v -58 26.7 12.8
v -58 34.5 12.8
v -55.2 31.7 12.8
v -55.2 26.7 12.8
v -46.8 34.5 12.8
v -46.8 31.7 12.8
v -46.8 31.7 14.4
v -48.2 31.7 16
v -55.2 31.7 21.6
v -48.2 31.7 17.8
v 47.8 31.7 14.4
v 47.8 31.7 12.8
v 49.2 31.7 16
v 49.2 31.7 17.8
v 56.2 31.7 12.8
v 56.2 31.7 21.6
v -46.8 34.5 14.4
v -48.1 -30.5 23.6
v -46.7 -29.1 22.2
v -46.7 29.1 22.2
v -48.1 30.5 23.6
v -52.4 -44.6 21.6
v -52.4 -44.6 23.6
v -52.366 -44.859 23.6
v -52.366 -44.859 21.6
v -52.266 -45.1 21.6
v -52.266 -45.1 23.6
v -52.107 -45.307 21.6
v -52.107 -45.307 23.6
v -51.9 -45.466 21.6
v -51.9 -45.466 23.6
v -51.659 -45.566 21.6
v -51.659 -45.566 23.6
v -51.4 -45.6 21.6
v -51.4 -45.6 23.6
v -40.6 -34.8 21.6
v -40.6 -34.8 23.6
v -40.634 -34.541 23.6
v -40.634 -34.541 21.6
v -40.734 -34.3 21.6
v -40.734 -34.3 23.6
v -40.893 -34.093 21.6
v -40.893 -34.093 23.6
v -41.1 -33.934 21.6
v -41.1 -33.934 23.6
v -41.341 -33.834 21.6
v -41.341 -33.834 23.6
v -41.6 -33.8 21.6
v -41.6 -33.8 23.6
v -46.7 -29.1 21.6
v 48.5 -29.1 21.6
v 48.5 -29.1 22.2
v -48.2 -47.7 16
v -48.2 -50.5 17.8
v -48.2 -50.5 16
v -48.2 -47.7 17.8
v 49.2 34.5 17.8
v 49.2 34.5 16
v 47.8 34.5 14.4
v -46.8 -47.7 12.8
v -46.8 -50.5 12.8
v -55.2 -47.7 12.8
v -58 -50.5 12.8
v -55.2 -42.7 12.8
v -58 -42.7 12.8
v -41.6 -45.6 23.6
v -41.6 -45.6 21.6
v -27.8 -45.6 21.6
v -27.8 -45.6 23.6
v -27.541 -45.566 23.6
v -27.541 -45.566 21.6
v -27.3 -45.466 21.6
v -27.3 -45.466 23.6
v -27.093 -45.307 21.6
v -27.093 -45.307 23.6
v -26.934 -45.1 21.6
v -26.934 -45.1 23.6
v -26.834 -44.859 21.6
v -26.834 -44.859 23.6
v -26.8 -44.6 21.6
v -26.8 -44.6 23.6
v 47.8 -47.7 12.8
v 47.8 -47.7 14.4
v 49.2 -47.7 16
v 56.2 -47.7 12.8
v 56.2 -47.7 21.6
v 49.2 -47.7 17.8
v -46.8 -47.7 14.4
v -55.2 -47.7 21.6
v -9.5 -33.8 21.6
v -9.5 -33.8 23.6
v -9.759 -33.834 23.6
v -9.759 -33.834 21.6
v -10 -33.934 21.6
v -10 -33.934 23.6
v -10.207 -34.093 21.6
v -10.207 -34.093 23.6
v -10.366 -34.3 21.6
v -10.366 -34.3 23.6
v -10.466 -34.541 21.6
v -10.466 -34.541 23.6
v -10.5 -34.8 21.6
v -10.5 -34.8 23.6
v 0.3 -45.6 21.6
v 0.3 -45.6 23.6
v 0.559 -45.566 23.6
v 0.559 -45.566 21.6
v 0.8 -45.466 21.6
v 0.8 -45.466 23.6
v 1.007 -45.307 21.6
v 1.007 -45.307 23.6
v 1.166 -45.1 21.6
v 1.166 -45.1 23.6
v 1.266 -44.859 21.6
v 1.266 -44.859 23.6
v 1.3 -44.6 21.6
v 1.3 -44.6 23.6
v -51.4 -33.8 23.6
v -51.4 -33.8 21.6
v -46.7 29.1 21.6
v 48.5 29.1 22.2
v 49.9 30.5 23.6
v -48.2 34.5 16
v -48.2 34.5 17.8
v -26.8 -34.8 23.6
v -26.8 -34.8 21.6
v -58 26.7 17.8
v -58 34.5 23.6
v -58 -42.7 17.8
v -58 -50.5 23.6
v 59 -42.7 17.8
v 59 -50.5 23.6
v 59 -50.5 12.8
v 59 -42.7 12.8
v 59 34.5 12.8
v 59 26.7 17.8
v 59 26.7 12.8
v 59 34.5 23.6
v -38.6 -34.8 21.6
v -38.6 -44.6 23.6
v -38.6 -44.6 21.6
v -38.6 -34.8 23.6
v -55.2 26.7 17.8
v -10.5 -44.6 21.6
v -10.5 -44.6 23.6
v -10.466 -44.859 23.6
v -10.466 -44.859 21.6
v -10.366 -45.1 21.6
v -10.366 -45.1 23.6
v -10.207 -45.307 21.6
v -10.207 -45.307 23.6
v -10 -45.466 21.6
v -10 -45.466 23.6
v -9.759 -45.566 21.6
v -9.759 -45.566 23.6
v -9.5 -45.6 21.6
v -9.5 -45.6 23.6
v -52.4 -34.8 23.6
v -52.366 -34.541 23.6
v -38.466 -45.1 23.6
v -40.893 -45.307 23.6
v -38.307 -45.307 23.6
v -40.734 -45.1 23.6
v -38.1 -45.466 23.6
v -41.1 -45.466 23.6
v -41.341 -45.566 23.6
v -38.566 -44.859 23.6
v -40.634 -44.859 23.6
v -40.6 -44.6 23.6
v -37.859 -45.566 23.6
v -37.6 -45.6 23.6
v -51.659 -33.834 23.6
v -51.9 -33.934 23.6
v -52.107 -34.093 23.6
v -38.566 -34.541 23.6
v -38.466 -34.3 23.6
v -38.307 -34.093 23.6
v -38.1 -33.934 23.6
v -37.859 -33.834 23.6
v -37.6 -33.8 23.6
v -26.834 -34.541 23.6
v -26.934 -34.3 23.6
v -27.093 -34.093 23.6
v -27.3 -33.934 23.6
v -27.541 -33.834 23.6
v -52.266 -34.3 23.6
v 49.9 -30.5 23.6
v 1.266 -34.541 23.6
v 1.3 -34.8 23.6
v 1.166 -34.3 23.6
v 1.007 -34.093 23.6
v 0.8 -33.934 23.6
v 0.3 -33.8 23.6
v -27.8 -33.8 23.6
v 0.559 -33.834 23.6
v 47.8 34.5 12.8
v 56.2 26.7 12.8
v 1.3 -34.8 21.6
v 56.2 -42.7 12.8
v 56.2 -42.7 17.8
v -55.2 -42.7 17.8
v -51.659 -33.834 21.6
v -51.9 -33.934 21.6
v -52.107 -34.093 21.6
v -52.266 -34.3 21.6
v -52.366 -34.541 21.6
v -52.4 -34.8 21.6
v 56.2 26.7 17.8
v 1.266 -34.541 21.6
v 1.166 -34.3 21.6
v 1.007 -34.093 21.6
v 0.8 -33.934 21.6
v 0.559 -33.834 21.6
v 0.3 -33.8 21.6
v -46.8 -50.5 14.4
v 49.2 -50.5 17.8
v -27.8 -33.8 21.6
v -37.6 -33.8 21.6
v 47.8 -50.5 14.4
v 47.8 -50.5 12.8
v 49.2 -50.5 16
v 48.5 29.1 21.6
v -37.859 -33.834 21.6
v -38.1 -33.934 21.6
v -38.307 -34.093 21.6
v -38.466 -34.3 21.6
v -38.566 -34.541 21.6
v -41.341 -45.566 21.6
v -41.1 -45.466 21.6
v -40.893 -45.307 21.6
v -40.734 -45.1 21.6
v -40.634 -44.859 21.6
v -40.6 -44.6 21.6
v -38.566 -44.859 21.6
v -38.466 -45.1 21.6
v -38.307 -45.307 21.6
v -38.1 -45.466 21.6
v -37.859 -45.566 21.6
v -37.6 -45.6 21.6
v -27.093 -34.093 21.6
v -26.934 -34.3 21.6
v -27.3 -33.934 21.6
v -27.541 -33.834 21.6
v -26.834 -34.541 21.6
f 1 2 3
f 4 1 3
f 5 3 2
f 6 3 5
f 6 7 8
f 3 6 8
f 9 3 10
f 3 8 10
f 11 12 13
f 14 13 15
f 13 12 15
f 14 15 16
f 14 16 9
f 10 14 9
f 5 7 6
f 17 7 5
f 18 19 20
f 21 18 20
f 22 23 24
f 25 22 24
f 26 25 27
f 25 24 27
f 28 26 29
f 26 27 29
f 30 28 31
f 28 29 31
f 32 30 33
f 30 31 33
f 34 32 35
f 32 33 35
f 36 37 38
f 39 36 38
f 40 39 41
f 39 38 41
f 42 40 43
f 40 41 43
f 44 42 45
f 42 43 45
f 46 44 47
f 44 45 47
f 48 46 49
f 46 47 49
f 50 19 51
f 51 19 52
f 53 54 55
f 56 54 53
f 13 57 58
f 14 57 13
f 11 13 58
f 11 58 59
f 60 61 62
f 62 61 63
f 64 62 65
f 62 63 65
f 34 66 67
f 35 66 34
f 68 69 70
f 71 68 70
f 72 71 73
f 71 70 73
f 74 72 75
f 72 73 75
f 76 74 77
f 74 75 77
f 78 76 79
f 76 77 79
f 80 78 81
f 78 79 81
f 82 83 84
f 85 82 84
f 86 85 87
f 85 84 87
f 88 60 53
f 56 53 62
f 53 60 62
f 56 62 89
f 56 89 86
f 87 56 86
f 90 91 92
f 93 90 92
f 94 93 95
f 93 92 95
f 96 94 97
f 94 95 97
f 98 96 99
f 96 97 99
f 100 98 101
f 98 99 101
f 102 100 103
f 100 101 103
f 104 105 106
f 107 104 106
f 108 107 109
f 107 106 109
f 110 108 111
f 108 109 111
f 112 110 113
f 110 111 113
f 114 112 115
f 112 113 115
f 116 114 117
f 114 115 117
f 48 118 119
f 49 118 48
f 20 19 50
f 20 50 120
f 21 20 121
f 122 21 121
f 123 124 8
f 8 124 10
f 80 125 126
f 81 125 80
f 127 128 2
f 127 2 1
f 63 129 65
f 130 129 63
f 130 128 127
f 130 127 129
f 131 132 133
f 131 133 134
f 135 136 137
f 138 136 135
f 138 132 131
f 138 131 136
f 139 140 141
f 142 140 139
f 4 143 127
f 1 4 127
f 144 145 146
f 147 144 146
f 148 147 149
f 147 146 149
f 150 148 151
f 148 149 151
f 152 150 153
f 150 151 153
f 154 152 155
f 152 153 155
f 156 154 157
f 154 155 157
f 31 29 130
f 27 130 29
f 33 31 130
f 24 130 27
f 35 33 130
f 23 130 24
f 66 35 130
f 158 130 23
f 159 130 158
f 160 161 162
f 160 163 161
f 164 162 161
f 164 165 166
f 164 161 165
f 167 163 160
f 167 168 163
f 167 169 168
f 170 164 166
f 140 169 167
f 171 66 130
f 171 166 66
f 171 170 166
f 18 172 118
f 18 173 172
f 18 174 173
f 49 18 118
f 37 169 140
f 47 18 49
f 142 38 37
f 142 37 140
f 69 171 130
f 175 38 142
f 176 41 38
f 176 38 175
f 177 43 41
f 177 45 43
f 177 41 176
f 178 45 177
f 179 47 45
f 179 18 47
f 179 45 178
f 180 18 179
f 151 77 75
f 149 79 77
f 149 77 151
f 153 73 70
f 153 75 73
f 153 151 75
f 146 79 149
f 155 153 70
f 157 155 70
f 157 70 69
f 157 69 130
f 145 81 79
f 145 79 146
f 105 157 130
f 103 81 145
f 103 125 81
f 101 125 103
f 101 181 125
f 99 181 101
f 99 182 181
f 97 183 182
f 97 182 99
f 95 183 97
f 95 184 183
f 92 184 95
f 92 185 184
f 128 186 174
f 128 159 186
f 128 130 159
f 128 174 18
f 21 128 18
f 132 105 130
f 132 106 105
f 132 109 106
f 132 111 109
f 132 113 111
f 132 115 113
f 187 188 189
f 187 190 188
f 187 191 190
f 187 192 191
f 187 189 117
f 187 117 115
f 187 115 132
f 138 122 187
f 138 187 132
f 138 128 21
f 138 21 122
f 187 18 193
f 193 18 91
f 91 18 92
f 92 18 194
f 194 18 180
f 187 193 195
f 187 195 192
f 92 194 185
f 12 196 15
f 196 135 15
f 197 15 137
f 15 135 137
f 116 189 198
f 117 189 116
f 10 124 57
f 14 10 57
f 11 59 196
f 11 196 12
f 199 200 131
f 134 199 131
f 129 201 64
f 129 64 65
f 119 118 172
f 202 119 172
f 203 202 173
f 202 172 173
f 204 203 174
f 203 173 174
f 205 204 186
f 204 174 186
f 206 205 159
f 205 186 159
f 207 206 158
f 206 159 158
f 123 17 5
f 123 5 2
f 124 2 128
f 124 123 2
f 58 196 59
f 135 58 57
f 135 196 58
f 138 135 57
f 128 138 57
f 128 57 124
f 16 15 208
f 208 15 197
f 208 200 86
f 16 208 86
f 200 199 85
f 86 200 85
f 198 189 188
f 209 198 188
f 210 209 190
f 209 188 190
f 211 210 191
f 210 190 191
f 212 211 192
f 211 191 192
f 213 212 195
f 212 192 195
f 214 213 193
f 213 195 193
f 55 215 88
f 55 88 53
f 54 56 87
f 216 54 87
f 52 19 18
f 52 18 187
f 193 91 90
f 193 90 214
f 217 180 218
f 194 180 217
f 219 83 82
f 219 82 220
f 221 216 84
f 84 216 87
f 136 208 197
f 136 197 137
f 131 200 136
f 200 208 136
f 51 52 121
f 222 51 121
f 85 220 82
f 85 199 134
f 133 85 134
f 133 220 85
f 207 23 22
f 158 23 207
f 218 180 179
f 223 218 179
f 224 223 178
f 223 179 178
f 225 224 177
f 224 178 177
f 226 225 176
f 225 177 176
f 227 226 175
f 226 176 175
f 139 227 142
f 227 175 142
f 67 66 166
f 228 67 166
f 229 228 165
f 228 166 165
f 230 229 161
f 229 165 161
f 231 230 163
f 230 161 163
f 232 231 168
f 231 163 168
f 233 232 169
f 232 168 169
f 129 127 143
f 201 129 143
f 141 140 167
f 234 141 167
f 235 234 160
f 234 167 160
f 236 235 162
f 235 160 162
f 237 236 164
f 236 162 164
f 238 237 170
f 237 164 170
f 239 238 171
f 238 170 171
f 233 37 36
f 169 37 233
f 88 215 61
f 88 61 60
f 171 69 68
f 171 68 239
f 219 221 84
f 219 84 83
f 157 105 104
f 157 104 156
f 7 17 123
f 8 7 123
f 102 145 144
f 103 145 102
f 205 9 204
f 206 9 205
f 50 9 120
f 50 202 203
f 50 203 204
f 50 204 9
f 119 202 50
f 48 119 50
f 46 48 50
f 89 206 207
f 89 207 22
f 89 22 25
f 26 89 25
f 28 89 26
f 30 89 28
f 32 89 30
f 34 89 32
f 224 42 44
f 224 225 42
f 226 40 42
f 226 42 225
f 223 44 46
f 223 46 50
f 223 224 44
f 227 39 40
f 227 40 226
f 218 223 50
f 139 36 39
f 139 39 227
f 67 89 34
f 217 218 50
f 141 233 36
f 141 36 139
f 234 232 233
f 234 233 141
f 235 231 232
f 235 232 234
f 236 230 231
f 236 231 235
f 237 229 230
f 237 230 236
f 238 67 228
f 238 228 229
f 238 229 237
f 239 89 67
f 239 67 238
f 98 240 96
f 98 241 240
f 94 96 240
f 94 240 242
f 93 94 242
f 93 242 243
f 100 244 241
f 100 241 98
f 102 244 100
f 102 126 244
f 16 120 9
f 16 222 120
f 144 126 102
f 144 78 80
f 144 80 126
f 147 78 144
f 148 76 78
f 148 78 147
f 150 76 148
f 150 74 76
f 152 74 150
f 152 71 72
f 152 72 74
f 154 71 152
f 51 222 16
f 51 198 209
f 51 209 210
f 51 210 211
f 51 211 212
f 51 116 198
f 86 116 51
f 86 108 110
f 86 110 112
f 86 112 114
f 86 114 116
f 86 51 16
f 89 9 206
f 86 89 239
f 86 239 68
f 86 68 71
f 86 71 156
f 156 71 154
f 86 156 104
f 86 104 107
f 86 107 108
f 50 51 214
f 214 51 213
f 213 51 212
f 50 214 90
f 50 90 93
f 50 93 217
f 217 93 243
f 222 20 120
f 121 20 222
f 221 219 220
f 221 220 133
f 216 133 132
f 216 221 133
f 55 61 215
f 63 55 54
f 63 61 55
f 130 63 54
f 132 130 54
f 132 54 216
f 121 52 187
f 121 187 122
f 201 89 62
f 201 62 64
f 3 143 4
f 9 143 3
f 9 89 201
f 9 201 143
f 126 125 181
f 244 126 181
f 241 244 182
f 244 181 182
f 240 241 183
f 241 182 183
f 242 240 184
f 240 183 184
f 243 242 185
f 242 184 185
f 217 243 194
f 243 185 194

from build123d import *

# Parameters (mm, degrees)
SKETCH022_W     = 117
SKETCH022_H     = 85
PAD013_DEPTH    = 5.8
SKETCH023_W     = 95.2
SKETCH023_H     = 58.2
POCKET001_DEPTH = 5.801
SKETCH024_W     = 111.4
SKETCH024_H     = 79.4
POCKET002_DEPTH = 3.8
POCKET008_DEPTH = 5.801
PAD017_DEPTH    = 5
SKETCH044_W     = 2.8
SKETCH044_H     = 3.2
PAD018_DEPTH    = 1.4
SKETCH045_W     = 2.8
SKETCH045_H     = 3.2
PAD019_DEPTH    = 1.4
POCKET016_DEPTH = 85.001
CHAMFER001_SIZE = 1.4


with BuildPart() as part:
    # Sketch022 → Pad013 (new body)
    with BuildSketch(Plane.XY.offset(23.6)):
        with Locations((0.5, -8)):
            Rectangle(SKETCH022_W, SKETCH022_H)
    extrude(amount=-PAD013_DEPTH)

    # Sketch023 (on Face5 of Pad013) → Pocket001 (cut, through all)
    with BuildSketch(Plane.XY.offset(23.6)):
        with Locations((0.9, 0)):
            Rectangle(SKETCH023_W, SKETCH023_H)
    extrude(amount=-POCKET001_DEPTH, mode=Mode.SUBTRACT)

    # Sketch024 (on Face5 of Pocket001) → Pocket002 (cut)
    with BuildSketch(Plane(origin=(0, 0, 17.8), x_dir=(1, 0, 0), z_dir=(0, 0, -1))):
        with Locations((0.5, 8)):
            Rectangle(SKETCH024_W, SKETCH024_H)
    extrude(amount=-POCKET002_DEPTH, mode=Mode.SUBTRACT)

    # Sketch031 (on Face4 of Pocket002) → Pocket008 (cut, through all)
    with BuildSketch(Plane.XY.offset(23.6)):
        with BuildLine():
            Line((-51.4, -33.8), (-41.6, -33.8))
            ThreePointArc((-40.6, -34.8), (-40.892893, -34.092893), (-41.6, -33.8))
            Line((-40.6, -34.8), (-40.6, -44.6))
            ThreePointArc((-41.6, -45.6), (-40.892893, -45.307107), (-40.6, -44.6))
            Line((-41.6, -45.6), (-51.4, -45.6))
            ThreePointArc((-52.4, -44.6), (-52.107107, -45.307107), (-51.4, -45.6))
            Line((-52.4, -44.6), (-52.4, -34.8))
            ThreePointArc((-51.4, -33.8), (-52.107107, -34.092893), (-52.4, -34.8))
        make_face()
        with BuildLine():
            Line((-37.6, -33.8), (-27.8, -33.8))
            ThreePointArc((-26.8, -34.8), (-27.092893, -34.092893), (-27.8, -33.8))
            Line((-26.8, -34.8), (-26.8, -44.6))
            ThreePointArc((-27.8, -45.6), (-27.092893, -45.307107), (-26.8, -44.6))
            Line((-27.8, -45.6), (-37.6, -45.6))
            ThreePointArc((-38.6, -44.6), (-38.307107, -45.307107), (-37.6, -45.6))
            Line((-38.6, -44.6), (-38.6, -34.8))
            ThreePointArc((-37.6, -33.8), (-38.307107, -34.092893), (-38.6, -34.8))
        make_face()
        with BuildLine():
            Line((-9.5, -33.8), (0.3, -33.8))
            ThreePointArc((1.3, -34.8), (1.007107, -34.092893), (0.3, -33.8))
            Line((1.3, -34.8), (1.3, -44.6))
            ThreePointArc((0.3, -45.6), (1.007107, -45.307107), (1.3, -44.6))
            Line((0.3, -45.6), (-9.5, -45.6))
            ThreePointArc((-10.5, -44.6), (-10.207107, -45.307107), (-9.5, -45.6))
            Line((-10.5, -44.6), (-10.5, -34.8))
            ThreePointArc((-9.5, -33.8), (-10.207107, -34.092893), (-10.5, -34.8))
        make_face()
    extrude(amount=-POCKET008_DEPTH, mode=Mode.SUBTRACT)

    # Sketch038 (on Face5 of Pocket008) → Pad017 (join)
    with BuildSketch(Plane(origin=(0, 0, 17.8), x_dir=(1, 0, 0), z_dir=(0, 0, -1))):
        Polygon((-58, 50.5), (-48.2, 50.5), (-48.2, 47.7), (-55.2, 47.7), (-55.2, 42.7), (-58, 42.7), align=None)
        Polygon((59, 50.5), (49.2, 50.5), (49.2, 47.7), (56.2, 47.7), (56.2, 42.7), (59, 42.7), align=None)
        Polygon((59, -34.5), (49.2, -34.5), (49.2, -31.7), (56.2, -31.7), (56.2, -26.7), (59, -26.7), align=None)
        Polygon((-58, -34.5), (-48.2, -34.5), (-48.2, -31.7), (-55.2, -31.7), (-55.2, -26.7), (-58, -26.7), align=None)
    extrude(amount=PAD017_DEPTH)

    # Sketch044 (on Face66 of Pad017) → Pad018 (join)
    with BuildSketch(Plane.YZ.offset(-48.2)):
        with Locations((-49.1, 14.4)):
            Rectangle(SKETCH044_W, SKETCH044_H)
        with Locations((33.1, 14.4)):
            Rectangle(SKETCH044_W, SKETCH044_H)
    extrude(amount=PAD018_DEPTH)

    # Sketch045 (on Face68 of Pad018) → Pad019 (join)
    with BuildSketch(Plane(origin=(49.2, 0, 0), x_dir=(0, -1, 0), z_dir=(-1, 0, 0))):
        with Locations((-33.1, 14.4)):
            Rectangle(SKETCH045_W, SKETCH045_H)
        with Locations((49.1, 14.4)):
            Rectangle(SKETCH045_W, SKETCH045_H)
    extrude(amount=PAD019_DEPTH)

    # Sketch046 (on Face76 of Pad019) → Pocket016 (cut, through all)
    with BuildSketch(Plane.XZ.offset(50.5)):
        Polygon((-48.2, 16), (-46.8, 16), (-46.8, 14.4), align=None)
        Polygon((47.8, 16), (49.2, 16), (47.8, 14.4), align=None)
    extrude(amount=-POCKET016_DEPTH, mode=Mode.SUBTRACT)

    # Chamfer001
    chamfer001_edges = [part.edges().sort_by_distance(p)[0] for p in [
        (0.9, 29.1, 23.6),
        (-46.7, 0, 23.6),
        (48.5, 0, 23.6),
        (0.9, -29.1, 23.6),
    ]]
    chamfer(chamfer001_edges, length=CHAMFER001_SIZE)


solid = part.part
